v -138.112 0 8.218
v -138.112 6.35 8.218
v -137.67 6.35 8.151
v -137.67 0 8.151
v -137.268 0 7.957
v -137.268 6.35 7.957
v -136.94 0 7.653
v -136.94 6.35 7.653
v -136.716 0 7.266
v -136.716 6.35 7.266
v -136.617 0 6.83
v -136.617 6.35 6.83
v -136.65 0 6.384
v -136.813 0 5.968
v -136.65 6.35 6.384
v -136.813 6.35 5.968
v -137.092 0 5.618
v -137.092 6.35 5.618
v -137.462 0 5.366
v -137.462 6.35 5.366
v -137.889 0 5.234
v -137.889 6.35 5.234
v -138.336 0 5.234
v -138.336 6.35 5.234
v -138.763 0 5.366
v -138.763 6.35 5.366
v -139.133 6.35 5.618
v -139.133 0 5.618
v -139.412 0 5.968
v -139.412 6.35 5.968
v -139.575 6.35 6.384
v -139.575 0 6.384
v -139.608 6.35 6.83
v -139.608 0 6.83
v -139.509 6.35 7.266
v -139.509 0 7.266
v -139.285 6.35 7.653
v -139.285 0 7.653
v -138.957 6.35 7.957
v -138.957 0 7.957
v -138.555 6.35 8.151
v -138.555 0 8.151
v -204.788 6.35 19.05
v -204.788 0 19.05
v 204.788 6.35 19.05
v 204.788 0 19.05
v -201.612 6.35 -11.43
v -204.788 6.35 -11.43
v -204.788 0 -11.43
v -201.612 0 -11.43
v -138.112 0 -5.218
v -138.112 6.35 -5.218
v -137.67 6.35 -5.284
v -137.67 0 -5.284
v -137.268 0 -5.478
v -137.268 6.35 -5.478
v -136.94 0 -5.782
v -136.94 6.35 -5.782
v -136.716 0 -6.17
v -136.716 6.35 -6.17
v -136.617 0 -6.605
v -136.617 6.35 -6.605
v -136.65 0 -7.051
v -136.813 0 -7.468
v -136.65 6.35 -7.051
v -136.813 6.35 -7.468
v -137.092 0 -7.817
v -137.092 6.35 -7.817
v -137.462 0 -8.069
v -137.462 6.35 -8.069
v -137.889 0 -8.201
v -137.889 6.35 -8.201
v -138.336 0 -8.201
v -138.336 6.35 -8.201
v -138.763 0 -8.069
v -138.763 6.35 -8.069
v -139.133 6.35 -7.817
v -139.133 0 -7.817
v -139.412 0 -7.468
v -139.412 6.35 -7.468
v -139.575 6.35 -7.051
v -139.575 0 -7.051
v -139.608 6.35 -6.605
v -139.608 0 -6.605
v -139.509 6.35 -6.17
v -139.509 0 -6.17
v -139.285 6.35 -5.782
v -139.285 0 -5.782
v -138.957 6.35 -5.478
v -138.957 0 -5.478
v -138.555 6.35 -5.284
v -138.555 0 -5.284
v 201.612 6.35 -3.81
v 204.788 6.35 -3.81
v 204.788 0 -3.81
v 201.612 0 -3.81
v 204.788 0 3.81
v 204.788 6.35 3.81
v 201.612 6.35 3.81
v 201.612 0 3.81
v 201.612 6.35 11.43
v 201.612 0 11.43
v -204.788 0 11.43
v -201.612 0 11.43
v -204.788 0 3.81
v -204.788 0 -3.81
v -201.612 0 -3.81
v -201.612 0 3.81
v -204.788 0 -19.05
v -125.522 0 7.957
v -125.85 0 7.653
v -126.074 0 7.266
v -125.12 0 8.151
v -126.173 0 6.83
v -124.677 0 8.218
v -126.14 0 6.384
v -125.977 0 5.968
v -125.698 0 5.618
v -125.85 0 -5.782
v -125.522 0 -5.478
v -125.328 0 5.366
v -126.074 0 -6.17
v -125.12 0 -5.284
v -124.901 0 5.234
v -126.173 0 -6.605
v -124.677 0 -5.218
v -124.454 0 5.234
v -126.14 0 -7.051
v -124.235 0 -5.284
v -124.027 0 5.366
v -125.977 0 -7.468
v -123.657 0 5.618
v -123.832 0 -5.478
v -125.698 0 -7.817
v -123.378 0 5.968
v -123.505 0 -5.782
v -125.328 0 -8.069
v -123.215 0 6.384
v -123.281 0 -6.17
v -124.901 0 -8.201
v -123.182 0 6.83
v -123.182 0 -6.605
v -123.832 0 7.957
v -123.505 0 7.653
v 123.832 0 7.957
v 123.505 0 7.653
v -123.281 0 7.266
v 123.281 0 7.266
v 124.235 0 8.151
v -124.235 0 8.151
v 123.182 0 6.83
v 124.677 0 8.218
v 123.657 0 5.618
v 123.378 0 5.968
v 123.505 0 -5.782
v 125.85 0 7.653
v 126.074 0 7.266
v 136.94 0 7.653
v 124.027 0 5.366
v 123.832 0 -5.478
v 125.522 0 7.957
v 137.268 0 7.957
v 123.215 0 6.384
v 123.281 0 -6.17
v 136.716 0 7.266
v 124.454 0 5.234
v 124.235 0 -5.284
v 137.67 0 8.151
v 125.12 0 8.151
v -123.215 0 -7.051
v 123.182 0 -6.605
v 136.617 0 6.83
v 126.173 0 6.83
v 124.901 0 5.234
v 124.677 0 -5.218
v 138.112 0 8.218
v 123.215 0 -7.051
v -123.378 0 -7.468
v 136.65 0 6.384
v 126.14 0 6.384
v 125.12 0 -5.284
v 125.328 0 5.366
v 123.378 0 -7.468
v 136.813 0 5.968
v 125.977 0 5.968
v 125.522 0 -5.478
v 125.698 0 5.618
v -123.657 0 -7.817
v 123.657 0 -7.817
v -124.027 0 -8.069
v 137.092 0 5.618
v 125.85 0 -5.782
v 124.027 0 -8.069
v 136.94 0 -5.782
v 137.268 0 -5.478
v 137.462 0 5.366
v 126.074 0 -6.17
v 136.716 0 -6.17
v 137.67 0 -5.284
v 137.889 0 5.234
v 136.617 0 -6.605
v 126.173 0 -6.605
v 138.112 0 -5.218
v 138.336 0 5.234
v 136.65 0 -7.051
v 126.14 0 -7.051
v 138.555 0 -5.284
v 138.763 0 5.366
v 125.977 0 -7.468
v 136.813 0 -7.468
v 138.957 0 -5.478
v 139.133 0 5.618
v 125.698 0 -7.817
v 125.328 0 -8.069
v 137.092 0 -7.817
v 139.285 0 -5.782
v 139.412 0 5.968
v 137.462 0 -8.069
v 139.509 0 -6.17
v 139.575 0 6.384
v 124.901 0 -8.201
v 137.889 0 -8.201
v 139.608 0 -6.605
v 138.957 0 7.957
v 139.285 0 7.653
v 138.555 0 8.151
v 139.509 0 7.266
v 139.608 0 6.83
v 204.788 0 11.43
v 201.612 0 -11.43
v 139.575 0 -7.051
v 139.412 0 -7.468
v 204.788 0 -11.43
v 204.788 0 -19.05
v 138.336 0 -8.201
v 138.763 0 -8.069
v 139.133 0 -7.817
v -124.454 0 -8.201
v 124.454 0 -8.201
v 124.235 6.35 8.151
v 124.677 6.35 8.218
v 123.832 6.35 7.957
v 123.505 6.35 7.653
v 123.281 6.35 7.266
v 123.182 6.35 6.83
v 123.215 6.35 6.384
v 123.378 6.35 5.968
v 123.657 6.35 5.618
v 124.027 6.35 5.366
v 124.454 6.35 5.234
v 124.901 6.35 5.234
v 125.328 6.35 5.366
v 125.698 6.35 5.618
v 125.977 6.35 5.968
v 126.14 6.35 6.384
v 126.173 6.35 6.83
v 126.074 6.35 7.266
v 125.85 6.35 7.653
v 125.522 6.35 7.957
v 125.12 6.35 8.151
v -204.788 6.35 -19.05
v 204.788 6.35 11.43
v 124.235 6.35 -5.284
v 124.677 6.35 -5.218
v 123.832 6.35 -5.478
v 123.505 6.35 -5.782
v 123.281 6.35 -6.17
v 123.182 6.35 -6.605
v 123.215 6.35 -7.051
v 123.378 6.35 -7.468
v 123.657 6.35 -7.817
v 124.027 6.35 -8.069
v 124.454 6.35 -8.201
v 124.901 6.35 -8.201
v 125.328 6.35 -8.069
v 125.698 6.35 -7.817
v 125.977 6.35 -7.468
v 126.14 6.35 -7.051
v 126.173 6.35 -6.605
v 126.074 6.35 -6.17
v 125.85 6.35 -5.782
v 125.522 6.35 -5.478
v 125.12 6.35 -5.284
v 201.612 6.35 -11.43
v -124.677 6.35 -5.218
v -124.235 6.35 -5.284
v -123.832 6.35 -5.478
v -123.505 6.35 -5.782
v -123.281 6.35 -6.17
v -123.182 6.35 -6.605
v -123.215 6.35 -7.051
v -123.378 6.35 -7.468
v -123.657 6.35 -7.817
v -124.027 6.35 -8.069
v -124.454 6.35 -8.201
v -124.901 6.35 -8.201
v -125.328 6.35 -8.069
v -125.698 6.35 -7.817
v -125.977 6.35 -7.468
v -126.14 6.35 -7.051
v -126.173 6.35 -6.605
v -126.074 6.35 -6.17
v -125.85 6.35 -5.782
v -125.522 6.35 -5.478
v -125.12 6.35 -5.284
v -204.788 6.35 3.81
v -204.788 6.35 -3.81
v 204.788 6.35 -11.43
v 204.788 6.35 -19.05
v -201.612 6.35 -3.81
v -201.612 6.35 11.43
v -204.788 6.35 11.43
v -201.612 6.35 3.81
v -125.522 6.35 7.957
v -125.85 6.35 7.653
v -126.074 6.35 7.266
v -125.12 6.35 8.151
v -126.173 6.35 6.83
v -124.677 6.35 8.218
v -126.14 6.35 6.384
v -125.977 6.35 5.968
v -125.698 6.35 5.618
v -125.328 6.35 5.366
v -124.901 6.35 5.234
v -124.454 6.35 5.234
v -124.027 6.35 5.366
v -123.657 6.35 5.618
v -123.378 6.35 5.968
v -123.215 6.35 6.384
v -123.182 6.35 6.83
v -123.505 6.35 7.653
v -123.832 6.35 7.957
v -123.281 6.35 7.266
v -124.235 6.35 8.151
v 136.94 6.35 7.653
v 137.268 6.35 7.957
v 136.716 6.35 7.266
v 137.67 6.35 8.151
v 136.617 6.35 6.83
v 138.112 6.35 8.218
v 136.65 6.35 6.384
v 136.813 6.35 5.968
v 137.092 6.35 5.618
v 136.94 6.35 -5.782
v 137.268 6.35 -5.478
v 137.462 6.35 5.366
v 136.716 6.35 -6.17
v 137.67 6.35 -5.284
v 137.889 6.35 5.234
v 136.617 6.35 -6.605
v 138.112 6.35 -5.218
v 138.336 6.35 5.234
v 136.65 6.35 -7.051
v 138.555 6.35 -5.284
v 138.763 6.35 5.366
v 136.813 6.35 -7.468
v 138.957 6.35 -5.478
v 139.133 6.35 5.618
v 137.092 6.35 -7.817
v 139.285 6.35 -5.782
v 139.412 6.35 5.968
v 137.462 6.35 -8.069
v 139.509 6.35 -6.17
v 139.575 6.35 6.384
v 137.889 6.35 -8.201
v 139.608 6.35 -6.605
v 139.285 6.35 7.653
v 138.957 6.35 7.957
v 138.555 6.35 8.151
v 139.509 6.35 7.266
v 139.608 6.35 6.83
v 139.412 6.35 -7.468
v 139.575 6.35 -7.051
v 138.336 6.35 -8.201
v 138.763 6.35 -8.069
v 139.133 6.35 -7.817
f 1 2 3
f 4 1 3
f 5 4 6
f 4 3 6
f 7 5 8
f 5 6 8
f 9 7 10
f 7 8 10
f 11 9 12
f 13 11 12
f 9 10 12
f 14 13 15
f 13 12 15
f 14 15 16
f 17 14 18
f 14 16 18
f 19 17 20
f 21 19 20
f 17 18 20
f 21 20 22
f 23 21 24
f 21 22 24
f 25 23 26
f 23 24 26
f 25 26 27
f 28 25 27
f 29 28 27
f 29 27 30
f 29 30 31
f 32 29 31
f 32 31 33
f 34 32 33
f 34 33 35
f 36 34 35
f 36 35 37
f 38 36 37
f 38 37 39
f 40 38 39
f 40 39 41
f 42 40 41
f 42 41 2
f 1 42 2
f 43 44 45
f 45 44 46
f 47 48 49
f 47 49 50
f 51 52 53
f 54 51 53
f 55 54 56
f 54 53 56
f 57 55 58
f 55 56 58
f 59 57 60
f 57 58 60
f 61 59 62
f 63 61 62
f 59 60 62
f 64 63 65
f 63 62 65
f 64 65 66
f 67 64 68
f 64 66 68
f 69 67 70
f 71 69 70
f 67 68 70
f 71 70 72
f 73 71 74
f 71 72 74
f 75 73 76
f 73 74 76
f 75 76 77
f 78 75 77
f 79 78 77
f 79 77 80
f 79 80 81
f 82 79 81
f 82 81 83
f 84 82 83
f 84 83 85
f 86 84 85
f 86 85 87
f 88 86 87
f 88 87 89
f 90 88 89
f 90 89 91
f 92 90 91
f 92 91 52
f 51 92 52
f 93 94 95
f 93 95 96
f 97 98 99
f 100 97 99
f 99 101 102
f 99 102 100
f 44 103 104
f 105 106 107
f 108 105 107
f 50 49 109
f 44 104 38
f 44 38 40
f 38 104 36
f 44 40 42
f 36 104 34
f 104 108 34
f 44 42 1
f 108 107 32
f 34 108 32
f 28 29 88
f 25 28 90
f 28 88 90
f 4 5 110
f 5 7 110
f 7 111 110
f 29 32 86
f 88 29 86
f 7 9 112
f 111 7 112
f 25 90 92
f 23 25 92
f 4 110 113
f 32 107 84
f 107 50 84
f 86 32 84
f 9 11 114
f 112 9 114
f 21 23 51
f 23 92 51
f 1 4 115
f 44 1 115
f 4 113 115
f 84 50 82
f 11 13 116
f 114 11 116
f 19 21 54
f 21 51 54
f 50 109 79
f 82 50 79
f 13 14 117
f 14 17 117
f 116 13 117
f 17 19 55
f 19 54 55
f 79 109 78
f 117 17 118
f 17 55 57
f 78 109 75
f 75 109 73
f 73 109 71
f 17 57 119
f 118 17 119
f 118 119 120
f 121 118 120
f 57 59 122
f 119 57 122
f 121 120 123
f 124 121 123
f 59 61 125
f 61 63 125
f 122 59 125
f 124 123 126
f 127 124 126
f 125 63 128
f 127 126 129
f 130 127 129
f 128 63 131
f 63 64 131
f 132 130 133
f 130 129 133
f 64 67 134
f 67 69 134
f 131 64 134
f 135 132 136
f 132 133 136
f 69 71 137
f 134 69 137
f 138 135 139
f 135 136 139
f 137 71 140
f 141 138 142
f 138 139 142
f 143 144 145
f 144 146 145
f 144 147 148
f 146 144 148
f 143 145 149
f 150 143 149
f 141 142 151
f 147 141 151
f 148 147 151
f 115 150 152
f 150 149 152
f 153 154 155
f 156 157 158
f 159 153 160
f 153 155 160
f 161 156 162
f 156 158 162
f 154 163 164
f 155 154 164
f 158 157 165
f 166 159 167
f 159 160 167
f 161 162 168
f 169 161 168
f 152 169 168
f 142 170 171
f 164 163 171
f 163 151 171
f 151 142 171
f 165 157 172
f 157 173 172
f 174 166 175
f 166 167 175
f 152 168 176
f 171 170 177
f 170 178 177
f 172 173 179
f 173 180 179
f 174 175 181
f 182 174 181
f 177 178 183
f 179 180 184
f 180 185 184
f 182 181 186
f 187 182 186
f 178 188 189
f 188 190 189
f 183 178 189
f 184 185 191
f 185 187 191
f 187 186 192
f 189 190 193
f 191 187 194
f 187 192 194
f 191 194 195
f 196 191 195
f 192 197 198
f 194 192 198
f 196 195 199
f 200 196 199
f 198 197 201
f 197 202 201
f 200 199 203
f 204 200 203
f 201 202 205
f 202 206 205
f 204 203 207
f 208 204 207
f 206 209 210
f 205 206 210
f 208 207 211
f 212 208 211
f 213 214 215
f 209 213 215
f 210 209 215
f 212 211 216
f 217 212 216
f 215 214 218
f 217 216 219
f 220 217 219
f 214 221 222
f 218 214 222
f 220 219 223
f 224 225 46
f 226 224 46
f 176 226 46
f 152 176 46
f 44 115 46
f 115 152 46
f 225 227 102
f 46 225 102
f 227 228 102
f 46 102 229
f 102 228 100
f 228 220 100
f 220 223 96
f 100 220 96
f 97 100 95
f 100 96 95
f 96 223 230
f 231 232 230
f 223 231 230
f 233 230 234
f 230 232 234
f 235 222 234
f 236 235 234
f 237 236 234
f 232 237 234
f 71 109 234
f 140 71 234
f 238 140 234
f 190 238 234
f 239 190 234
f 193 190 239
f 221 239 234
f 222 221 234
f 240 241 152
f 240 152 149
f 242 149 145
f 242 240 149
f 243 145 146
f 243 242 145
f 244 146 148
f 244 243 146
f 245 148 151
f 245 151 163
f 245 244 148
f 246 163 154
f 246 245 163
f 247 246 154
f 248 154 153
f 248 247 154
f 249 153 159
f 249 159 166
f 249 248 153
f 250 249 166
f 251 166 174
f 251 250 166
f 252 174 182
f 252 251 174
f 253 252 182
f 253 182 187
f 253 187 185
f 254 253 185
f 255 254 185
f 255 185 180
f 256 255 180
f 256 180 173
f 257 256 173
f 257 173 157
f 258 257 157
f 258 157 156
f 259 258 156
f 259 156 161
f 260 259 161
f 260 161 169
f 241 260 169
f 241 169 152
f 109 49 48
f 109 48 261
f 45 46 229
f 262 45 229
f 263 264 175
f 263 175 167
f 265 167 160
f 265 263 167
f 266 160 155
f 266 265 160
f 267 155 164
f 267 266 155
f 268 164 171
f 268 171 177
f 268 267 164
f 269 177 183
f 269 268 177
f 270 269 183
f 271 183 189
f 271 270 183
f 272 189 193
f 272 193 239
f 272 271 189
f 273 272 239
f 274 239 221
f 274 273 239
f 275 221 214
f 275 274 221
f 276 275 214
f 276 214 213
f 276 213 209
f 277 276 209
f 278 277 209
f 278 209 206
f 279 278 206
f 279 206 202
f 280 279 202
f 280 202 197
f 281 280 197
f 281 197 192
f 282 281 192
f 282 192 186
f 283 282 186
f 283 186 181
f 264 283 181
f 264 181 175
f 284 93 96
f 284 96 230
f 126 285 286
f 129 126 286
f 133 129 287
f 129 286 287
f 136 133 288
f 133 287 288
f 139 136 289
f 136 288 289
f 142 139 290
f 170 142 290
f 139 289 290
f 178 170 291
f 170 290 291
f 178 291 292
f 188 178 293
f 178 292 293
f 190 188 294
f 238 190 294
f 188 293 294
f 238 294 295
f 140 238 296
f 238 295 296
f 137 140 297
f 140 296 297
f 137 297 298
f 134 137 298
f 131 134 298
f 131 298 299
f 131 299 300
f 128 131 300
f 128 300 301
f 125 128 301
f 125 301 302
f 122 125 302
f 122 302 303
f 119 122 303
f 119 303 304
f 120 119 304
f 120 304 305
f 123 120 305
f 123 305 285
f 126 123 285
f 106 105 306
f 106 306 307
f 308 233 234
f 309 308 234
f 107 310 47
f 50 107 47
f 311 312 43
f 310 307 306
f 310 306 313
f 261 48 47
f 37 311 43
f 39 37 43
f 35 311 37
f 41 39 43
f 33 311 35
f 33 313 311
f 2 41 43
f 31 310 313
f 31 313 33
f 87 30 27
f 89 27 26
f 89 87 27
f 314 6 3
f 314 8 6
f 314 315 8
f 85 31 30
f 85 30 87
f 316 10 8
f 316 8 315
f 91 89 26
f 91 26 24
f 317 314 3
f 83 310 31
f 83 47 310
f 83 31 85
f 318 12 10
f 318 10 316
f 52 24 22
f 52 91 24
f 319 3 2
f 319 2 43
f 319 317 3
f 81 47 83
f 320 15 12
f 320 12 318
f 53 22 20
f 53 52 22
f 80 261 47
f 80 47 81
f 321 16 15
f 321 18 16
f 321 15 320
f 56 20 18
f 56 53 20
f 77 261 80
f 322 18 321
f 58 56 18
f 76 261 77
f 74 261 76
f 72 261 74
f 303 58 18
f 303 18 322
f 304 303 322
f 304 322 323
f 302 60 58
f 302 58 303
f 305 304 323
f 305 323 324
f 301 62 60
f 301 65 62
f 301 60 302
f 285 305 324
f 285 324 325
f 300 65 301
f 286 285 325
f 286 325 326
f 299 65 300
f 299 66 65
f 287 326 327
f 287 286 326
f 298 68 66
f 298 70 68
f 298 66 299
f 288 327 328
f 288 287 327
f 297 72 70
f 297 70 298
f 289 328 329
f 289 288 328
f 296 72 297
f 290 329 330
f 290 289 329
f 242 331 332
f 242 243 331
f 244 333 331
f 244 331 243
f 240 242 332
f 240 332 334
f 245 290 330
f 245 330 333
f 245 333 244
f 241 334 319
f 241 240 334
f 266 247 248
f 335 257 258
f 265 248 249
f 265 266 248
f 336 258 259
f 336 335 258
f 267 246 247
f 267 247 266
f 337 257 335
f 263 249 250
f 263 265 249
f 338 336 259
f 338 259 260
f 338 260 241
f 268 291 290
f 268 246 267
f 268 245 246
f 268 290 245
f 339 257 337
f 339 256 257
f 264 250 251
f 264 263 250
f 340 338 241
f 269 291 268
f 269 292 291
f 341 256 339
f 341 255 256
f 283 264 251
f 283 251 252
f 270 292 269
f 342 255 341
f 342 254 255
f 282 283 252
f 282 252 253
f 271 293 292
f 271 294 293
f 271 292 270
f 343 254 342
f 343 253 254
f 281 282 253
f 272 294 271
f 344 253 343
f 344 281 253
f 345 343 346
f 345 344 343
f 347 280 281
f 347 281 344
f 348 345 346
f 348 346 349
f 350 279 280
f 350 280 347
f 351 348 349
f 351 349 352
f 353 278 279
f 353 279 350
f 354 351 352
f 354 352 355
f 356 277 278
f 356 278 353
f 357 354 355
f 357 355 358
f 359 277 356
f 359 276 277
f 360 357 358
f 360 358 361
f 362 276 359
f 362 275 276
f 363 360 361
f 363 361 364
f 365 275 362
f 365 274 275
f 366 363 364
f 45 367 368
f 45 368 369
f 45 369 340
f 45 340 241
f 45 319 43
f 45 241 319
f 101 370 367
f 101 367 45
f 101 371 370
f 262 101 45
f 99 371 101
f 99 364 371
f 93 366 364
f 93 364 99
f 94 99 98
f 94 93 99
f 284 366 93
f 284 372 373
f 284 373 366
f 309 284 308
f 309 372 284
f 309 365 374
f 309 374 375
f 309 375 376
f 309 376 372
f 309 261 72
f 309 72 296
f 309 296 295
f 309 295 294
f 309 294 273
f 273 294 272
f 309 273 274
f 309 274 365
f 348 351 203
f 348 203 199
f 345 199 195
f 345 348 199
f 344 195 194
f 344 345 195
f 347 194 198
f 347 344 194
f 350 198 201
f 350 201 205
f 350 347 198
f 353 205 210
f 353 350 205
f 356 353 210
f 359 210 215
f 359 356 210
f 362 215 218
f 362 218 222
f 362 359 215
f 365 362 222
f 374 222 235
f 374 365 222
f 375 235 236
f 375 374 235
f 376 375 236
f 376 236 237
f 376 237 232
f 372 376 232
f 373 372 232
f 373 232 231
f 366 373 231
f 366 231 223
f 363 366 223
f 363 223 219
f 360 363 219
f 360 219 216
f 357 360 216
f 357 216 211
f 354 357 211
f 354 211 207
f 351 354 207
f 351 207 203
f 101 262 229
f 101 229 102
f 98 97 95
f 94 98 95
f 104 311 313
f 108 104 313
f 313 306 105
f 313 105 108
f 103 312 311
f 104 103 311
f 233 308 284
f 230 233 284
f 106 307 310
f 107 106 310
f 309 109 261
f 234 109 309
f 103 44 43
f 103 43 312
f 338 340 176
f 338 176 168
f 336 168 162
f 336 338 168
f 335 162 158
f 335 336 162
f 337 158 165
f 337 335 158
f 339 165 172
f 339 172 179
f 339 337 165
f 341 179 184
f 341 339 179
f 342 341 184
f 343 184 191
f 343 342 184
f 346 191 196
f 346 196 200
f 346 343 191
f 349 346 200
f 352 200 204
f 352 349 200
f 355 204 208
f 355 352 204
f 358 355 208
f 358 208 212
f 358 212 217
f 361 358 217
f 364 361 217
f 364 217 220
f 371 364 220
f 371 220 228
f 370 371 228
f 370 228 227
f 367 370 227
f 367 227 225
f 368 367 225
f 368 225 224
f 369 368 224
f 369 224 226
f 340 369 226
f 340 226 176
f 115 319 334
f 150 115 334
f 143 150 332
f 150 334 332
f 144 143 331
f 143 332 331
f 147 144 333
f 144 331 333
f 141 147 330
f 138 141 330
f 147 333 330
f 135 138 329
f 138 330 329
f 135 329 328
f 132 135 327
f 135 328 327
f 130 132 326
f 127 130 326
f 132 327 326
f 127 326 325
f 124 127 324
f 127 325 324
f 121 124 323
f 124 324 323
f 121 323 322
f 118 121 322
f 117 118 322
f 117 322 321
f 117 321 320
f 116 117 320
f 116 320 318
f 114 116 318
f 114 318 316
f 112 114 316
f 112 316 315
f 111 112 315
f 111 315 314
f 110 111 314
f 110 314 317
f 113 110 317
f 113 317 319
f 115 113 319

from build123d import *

# Parameters (mm, degrees)
SKETCH1_W           = 409.575
SKETCH1_H           = 38.1
BOSS_EXTRUDE1_DEPTH = 6.35
CUT_EXTRUDE1_REACH  = 207.77
SKETCH2_W           = 3.175
SKETCH2_H           = 7.62
CUT_EXTRUDE2_REACH  = 207.77
SKETCH3_R           = 1.5


with BuildPart() as part:
    # Sketch1 → Boss-Extrude1 (new body)
    with BuildSketch(Plane(origin=(0, 0, 0), x_dir=(1, 0, 0), z_dir=(0, 1, 0))):
        Rectangle(SKETCH1_W, SKETCH1_H)
    extrude(amount=BOSS_EXTRUDE1_DEPTH)

    # Sketch2 → Cut-Extrude1 (cut, up to next)
    with BuildSketch(Plane(origin=(0, 6.35, 0), x_dir=(1, 0, 0), z_dir=(0, 1, 0)), mode=Mode.PRIVATE) as cut_extrude1_sk1:
        with Locations((-203.2, 7.62)):
            Rectangle(SKETCH2_W, SKETCH2_H)
    cut_extrude1_tool1 = extrude(cut_extrude1_sk1.sketch, amount=-CUT_EXTRUDE1_REACH, mode=Mode.PRIVATE) & part.part
    # Sketch2 → Cut-Extrude1 (cut, up to next)
    with BuildSketch(Plane(origin=(0, 6.35, 0), x_dir=(1, 0, 0), z_dir=(0, 1, 0)), mode=Mode.PRIVATE) as cut_extrude1_sk2:
        with Locations((-203.2, -7.62)):
            Rectangle(SKETCH2_W, SKETCH2_H)
    cut_extrude1_tool2 = extrude(cut_extrude1_sk2.sketch, amount=-CUT_EXTRUDE1_REACH, mode=Mode.PRIVATE) & part.part
    cut_extrude1_1 = cut_extrude1_tool1.solids().sort_by_distance((-203.2, 6.35, -7.62))[0]
    add(cut_extrude1_1, mode=Mode.SUBTRACT)
    cut_extrude1_2 = cut_extrude1_tool2.solids().sort_by_distance((-203.2, 6.35, 7.62))[0]
    add(cut_extrude1_2, mode=Mode.SUBTRACT)
    cut_extrude1 = cut_extrude1_1 + cut_extrude1_2  # Cut-Extrude1 as one shape, for the pattern or mirror that repeats it

    # Mirror1: Cut-Extrude1 across plane
    add(cut_extrude1.mirror(Plane(origin=(0, 0, 0), x_dir=(0, 0, 1), z_dir=(1, 0, 0))), mode=Mode.SUBTRACT)

    # Sketch3 → Cut-Extrude2 (cut, up to next)
    with BuildSketch(Plane(origin=(0, 6.35, 0), x_dir=(1, 0, 0), z_dir=(0, 1, 0)), mode=Mode.PRIVATE) as cut_extrude2_sk1:
        with Locations(Location((-138.1125, 6.717514421, 0), (0, 0, 270))):
            Circle(SKETCH3_R)
    cut_extrude2_tool1 = extrude(cut_extrude2_sk1.sketch, amount=-CUT_EXTRUDE2_REACH, mode=Mode.PRIVATE) & part.part
    # Sketch3 → Cut-Extrude2 (cut, up to next)
    with BuildSketch(Plane(origin=(0, 6.35, 0), x_dir=(1, 0, 0), z_dir=(0, 1, 0)), mode=Mode.PRIVATE) as cut_extrude2_sk2:
        with Locations(Location((-138.1125, -6.717514421, 0), (0, 0, 270))):
            Circle(SKETCH3_R)
    cut_extrude2_tool2 = extrude(cut_extrude2_sk2.sketch, amount=-CUT_EXTRUDE2_REACH, mode=Mode.PRIVATE) & part.part
    # Sketch3 → Cut-Extrude2 (cut, up to next)
    with BuildSketch(Plane(origin=(0, 6.35, 0), x_dir=(1, 0, 0), z_dir=(0, 1, 0)), mode=Mode.PRIVATE) as cut_extrude2_sk3:
        with Locations(Location((-124.677471157, 6.717514421, 0), (0, 0, 270))):
            Circle(SKETCH3_R)
    cut_extrude2_tool3 = extrude(cut_extrude2_sk3.sketch, amount=-CUT_EXTRUDE2_REACH, mode=Mode.PRIVATE) & part.part
    # Sketch3 → Cut-Extrude2 (cut, up to next)
    with BuildSketch(Plane(origin=(0, 6.35, 0), x_dir=(1, 0, 0), z_dir=(0, 1, 0)), mode=Mode.PRIVATE) as cut_extrude2_sk4:
        with Locations(Location((-124.677471157, -6.717514421, 0), (0, 0, 270))):
            Circle(SKETCH3_R)
    cut_extrude2_tool4 = extrude(cut_extrude2_sk4.sketch, amount=-CUT_EXTRUDE2_REACH, mode=Mode.PRIVATE) & part.part
    cut_extrude2_1 = cut_extrude2_tool1.solids().sort_by_distance((-138.1125, 6.35, -6.717514))[0]
    add(cut_extrude2_1, mode=Mode.SUBTRACT)
    cut_extrude2_2 = cut_extrude2_tool2.solids().sort_by_distance((-138.1125, 6.35, 6.717514))[0]
    add(cut_extrude2_2, mode=Mode.SUBTRACT)
    cut_extrude2_3 = cut_extrude2_tool3.solids().sort_by_distance((-124.677471, 6.35, -6.717514))[0]
    add(cut_extrude2_3, mode=Mode.SUBTRACT)
    cut_extrude2_4 = cut_extrude2_tool4.solids().sort_by_distance((-124.677471, 6.35, 6.717514))[0]
    add(cut_extrude2_4, mode=Mode.SUBTRACT)
    cut_extrude2 = cut_extrude2_1 + cut_extrude2_2 + cut_extrude2_3 + cut_extrude2_4  # Cut-Extrude2 as one shape, for the pattern or mirror that repeats it

    # Mirror2: Cut-Extrude2 across plane
    add(cut_extrude2.mirror(Plane(origin=(0, 0, 0), x_dir=(0, 0, 1), z_dir=(1, 0, 0))), mode=Mode.SUBTRACT)


solid = part.part
